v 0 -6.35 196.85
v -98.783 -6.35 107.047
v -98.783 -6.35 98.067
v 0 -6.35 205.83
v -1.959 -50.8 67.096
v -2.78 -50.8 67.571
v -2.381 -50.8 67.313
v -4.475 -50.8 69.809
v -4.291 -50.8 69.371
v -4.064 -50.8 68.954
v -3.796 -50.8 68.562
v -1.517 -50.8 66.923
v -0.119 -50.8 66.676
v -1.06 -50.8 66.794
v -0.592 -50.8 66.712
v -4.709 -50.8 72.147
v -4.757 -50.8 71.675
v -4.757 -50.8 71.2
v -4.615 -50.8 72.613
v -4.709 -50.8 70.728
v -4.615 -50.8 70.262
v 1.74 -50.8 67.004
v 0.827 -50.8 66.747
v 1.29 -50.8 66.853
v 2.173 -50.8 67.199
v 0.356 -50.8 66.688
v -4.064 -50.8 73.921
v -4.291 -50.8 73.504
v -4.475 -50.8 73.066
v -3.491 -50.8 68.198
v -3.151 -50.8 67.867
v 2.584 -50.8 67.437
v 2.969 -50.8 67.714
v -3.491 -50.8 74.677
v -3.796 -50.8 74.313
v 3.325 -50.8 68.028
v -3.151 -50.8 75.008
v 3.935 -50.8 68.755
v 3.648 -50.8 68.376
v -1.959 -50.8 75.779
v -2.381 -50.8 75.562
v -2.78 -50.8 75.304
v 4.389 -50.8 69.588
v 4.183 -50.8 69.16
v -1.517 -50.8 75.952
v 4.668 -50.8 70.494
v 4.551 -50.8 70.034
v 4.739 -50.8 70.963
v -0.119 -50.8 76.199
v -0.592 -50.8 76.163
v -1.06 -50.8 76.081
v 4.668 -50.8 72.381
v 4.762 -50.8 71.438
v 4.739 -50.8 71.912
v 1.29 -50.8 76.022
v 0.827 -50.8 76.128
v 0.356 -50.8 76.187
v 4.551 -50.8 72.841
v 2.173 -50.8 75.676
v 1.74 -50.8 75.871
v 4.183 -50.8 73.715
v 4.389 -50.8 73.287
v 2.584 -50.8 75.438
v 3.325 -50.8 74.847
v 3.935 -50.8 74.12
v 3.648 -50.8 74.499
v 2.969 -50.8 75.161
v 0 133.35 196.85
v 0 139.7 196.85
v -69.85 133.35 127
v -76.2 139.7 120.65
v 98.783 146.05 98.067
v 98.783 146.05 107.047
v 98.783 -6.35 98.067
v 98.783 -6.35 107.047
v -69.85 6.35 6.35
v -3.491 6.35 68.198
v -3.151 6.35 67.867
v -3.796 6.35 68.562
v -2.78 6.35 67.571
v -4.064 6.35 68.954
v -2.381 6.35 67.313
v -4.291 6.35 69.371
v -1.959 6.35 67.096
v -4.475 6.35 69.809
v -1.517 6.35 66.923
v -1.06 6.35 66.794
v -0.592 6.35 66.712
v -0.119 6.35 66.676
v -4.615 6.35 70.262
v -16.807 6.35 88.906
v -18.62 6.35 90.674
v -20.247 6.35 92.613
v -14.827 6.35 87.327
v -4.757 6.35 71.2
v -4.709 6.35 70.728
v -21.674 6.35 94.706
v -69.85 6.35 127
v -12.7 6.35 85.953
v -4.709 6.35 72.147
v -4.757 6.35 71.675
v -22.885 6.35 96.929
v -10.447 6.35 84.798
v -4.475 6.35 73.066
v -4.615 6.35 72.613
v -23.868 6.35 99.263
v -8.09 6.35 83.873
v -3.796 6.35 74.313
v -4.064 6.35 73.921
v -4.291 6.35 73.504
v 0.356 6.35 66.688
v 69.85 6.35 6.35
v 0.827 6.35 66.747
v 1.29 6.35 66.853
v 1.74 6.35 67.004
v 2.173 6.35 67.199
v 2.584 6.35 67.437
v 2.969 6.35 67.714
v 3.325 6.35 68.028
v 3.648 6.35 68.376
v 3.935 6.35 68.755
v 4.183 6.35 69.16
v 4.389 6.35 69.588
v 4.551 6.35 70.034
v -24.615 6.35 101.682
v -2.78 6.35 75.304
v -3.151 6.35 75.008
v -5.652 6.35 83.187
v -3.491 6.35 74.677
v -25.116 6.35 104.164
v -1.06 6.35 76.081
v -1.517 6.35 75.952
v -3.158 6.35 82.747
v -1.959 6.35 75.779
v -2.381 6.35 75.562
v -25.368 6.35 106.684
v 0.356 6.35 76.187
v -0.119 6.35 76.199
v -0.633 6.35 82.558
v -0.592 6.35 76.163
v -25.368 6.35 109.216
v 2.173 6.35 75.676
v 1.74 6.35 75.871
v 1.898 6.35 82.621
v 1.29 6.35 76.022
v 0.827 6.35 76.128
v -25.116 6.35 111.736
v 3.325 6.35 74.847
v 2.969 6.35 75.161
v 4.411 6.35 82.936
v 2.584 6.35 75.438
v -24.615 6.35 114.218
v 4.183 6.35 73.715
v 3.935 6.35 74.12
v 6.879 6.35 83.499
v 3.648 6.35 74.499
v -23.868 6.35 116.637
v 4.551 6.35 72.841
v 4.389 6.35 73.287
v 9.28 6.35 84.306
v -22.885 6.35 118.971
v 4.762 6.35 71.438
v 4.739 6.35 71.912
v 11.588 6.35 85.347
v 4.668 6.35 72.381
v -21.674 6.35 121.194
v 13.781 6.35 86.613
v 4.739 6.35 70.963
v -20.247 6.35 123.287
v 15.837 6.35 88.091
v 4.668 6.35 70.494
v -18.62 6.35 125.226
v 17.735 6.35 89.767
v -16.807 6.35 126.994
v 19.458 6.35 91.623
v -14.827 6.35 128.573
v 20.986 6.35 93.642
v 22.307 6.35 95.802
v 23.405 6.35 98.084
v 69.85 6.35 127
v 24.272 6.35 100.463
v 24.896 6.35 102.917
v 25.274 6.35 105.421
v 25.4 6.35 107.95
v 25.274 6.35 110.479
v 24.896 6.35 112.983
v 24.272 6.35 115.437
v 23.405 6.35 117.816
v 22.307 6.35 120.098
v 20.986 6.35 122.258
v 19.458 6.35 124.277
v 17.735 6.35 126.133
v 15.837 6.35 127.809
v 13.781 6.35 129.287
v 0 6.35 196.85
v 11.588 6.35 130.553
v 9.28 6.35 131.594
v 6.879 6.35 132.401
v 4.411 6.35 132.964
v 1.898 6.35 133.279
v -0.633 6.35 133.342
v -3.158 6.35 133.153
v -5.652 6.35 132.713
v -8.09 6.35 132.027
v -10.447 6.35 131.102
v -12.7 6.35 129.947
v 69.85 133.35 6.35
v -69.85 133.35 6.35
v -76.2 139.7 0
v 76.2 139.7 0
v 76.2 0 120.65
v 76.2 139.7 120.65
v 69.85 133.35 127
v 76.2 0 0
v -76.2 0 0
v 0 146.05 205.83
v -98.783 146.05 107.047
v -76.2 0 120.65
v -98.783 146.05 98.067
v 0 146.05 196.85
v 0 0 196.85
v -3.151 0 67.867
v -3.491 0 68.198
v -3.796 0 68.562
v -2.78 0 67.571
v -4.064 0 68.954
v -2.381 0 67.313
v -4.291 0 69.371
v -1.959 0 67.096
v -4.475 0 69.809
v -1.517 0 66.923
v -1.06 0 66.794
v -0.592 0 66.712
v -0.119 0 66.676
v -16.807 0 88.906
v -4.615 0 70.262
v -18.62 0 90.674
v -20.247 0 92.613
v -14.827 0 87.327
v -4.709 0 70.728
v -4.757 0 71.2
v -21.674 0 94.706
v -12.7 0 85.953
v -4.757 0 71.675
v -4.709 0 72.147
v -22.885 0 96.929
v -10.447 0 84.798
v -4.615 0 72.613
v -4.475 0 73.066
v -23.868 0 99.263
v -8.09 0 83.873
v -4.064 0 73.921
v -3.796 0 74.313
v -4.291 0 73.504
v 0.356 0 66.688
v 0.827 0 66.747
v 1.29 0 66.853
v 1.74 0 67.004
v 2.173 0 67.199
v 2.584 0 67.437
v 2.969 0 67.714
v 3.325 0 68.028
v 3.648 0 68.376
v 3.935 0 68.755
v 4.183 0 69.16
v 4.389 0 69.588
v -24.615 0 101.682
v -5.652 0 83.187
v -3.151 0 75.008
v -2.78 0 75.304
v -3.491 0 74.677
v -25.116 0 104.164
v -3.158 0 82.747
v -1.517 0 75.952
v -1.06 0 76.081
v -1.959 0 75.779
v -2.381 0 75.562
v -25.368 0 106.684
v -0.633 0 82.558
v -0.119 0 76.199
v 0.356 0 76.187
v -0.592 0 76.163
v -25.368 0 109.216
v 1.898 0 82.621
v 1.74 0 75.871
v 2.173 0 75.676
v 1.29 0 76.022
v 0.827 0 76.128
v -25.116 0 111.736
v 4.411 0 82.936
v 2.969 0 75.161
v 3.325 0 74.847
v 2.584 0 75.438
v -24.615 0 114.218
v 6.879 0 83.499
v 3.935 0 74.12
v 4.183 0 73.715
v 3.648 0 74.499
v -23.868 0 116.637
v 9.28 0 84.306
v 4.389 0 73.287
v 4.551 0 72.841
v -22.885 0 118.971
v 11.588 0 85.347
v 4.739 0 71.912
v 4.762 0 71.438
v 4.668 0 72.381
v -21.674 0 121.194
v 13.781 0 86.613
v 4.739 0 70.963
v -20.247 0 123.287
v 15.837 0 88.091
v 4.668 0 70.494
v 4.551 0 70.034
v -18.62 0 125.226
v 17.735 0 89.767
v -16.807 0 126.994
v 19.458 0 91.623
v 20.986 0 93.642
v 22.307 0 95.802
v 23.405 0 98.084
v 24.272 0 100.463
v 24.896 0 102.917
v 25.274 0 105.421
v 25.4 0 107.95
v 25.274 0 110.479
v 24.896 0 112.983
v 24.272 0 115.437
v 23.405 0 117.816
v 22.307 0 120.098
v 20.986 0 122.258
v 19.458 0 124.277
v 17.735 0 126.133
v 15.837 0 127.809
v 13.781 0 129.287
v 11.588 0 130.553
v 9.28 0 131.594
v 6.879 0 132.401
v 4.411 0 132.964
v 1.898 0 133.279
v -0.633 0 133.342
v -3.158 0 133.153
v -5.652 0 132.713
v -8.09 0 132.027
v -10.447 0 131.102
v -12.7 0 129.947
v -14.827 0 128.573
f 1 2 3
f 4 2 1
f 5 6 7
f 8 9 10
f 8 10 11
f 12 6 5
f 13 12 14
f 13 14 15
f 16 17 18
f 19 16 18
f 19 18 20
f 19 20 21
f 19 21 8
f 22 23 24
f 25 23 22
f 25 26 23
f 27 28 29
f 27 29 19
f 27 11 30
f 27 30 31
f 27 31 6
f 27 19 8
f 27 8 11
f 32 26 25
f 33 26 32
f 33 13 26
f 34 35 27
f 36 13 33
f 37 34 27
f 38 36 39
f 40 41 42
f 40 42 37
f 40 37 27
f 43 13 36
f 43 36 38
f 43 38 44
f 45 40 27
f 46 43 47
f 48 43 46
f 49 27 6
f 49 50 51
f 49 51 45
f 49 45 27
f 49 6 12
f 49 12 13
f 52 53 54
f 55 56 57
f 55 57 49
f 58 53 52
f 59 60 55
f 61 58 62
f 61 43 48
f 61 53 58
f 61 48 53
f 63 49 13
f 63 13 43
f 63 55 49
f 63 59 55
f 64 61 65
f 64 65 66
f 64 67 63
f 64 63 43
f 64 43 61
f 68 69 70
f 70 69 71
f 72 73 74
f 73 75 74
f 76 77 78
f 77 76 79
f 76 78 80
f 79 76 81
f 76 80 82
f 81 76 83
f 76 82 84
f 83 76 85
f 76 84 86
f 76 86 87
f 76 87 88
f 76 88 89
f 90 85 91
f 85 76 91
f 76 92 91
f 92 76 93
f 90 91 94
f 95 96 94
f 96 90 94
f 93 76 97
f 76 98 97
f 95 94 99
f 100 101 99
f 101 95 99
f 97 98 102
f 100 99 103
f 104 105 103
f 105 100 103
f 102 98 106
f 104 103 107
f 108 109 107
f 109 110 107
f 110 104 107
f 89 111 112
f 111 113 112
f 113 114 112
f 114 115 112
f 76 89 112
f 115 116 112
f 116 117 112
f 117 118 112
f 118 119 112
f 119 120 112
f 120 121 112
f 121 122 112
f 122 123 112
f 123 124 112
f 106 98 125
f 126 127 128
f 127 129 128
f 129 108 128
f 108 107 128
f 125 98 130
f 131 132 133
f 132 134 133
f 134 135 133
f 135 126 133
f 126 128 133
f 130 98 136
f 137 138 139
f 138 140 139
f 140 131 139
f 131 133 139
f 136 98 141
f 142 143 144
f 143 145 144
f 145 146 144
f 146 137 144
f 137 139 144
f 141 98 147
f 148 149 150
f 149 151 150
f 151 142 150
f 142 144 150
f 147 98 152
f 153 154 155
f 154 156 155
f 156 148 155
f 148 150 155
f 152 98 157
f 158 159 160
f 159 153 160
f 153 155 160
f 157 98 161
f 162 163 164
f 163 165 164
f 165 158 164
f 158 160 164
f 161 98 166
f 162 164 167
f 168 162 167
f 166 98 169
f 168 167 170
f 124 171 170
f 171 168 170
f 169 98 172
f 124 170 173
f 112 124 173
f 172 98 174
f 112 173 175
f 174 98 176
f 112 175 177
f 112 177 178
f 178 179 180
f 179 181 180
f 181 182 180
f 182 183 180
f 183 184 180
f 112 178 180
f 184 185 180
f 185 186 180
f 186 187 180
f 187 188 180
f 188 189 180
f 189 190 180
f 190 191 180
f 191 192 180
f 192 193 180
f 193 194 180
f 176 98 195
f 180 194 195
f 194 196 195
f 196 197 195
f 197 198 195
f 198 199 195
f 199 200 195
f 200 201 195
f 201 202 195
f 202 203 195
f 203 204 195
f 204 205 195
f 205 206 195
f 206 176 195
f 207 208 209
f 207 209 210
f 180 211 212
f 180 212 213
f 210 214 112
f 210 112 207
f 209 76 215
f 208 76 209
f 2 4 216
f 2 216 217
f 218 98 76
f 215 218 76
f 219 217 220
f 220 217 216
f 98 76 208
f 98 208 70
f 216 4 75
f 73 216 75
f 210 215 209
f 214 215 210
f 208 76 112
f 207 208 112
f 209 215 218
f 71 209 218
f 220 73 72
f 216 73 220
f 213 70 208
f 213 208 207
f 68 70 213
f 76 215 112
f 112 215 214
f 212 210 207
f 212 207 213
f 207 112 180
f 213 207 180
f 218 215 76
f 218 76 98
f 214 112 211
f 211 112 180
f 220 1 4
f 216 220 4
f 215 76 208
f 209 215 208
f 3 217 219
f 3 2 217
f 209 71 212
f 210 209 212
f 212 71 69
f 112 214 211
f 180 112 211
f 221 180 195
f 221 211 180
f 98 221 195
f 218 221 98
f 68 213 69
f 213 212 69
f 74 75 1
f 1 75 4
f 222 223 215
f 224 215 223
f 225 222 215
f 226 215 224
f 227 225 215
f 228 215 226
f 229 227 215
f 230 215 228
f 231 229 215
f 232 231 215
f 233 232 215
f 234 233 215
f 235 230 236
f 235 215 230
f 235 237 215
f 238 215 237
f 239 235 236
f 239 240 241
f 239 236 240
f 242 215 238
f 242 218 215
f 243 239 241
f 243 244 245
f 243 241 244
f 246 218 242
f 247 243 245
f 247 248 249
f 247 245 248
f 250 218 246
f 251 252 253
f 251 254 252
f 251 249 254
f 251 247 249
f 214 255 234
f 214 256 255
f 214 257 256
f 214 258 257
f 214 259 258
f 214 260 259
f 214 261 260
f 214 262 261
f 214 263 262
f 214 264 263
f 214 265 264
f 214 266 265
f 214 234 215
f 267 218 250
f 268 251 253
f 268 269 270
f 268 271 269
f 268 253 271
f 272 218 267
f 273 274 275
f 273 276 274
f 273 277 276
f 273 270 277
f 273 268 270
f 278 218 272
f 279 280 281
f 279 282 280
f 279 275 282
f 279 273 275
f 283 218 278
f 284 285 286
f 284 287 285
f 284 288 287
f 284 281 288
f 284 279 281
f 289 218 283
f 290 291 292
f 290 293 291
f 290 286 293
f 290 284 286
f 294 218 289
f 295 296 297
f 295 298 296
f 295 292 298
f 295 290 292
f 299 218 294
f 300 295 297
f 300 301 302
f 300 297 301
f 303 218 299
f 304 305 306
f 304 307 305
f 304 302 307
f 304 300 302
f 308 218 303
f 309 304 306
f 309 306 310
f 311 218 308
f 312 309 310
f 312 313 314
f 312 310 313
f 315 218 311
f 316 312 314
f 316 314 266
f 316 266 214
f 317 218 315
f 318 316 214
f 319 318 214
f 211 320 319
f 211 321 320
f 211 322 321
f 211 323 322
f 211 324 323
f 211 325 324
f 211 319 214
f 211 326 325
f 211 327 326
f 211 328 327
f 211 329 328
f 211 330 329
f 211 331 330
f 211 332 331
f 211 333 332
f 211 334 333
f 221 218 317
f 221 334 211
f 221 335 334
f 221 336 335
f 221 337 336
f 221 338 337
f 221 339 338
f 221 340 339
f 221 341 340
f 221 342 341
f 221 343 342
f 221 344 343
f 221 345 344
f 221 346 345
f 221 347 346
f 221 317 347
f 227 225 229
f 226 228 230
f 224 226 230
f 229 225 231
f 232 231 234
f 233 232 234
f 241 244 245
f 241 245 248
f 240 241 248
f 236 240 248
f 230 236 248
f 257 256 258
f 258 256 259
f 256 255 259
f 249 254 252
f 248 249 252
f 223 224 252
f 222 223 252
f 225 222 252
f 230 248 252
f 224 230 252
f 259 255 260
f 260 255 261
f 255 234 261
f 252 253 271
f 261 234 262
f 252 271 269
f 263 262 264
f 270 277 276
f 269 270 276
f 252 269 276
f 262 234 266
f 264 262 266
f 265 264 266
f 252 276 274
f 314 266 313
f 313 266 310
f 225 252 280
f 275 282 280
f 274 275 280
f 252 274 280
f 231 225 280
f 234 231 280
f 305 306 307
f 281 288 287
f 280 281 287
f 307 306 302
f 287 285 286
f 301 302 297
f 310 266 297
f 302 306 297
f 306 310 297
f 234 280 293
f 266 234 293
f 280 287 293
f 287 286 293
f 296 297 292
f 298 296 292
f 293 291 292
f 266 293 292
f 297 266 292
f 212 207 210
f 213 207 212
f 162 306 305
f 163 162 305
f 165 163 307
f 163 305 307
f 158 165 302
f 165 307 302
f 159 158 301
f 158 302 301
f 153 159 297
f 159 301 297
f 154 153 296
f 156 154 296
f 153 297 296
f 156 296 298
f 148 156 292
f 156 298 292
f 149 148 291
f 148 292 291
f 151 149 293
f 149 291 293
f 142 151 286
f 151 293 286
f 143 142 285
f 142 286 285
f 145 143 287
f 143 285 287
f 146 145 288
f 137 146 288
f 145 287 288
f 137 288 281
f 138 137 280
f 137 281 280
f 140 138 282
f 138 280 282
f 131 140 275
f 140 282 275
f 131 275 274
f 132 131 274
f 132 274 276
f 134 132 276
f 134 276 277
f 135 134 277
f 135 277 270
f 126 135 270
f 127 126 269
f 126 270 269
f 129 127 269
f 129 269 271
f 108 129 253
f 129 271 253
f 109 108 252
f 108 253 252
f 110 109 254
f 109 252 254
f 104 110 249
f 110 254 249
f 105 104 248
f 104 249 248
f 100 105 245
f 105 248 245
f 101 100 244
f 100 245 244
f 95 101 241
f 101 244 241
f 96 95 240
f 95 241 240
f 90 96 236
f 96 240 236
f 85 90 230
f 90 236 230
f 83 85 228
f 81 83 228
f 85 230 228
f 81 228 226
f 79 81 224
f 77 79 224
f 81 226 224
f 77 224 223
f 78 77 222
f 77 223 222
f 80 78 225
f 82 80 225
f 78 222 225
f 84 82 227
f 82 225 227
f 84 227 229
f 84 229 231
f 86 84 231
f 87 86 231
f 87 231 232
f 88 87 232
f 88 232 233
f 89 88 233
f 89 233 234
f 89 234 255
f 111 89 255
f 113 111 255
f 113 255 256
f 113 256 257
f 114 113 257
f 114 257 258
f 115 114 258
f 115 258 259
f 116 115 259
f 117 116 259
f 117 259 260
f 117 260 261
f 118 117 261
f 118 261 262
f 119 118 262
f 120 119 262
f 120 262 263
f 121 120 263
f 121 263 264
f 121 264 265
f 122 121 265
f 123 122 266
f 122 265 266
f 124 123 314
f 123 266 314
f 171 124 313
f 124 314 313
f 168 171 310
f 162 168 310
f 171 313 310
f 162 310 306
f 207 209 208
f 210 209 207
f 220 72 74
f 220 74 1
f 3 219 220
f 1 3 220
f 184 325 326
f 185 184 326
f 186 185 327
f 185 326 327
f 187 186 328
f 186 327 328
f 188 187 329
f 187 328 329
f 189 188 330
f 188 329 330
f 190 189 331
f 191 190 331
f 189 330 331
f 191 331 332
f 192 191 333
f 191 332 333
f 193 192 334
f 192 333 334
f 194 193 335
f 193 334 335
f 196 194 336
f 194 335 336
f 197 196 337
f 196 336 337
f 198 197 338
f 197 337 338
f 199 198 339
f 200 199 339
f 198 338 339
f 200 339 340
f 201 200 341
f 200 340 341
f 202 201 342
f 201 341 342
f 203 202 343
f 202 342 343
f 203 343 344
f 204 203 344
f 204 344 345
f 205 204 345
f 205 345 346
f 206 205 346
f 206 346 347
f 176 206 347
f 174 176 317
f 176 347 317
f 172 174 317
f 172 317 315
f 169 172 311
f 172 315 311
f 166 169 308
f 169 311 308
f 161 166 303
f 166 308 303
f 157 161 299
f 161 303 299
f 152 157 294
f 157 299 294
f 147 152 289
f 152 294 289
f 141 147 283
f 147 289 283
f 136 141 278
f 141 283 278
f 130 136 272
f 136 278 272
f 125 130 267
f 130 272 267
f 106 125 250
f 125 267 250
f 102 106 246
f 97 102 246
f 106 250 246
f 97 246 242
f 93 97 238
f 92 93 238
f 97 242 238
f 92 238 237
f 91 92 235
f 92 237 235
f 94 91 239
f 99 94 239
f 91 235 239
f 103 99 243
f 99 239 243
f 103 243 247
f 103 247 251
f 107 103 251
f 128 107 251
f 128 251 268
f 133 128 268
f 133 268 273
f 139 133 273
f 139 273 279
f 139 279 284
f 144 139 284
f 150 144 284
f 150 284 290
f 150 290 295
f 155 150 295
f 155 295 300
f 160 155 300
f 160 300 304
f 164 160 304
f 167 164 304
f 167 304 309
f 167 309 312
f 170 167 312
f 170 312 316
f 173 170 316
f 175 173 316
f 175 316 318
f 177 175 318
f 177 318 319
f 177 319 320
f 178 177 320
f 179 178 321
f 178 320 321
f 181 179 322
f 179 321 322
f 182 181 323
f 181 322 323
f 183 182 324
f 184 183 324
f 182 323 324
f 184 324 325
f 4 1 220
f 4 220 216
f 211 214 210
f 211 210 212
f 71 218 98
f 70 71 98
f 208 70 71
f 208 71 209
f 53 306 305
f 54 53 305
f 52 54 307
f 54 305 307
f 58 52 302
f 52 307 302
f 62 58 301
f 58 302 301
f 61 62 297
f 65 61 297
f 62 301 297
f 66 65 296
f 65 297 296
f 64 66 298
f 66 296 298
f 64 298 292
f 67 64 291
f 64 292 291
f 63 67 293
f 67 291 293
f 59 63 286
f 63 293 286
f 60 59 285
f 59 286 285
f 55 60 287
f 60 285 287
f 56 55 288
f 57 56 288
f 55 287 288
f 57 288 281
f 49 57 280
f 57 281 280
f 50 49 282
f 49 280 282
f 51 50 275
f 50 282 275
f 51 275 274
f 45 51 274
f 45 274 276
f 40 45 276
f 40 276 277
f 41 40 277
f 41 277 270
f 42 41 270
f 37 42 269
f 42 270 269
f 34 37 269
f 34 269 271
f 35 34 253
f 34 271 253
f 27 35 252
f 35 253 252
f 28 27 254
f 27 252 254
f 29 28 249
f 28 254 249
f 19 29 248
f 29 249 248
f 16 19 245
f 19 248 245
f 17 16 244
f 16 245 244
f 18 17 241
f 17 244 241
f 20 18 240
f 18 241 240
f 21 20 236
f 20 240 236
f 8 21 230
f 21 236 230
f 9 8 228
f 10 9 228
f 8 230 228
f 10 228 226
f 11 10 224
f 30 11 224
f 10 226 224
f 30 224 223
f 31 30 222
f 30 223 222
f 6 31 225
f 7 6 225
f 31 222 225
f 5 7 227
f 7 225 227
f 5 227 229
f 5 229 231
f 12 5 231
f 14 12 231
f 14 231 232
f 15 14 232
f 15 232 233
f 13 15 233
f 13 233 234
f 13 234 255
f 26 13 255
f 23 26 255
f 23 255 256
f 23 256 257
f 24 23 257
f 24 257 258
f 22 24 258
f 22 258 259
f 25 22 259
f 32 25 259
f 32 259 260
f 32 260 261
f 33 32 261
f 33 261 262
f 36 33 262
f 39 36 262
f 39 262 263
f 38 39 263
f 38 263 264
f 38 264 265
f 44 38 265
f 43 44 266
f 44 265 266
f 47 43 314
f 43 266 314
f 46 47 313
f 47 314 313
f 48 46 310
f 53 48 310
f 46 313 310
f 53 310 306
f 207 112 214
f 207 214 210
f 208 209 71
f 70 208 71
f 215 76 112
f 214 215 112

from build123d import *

# Parameters (mm, degrees)
F0_W           = 152.4
F0_H           = 6.35
F1_DEPTH       = 139.7
F2_SIZE2       = 6.34999
F2_SIZE        = 6.34999
F3_W           = 6.35
F3_H           = 127
F4_DEPTH       = 139.7
F5_SIZE2       = 6.34999
F5_SIZE        = 6.34999
F5_2_SIZE2     = 6.34999
F5_2_SIZE      = 6.34999
F7_R           = 4.7625
F7_R_2         = 25.4
F8_DEPTH       = 6.35
F10_DEPTH      = 6.35
F11_SIZE2      = 6.34999
F11_SIZE       = 6.34999
F11_2_SIZE2    = 6.34999
F11_2_SIZE     = 6.34999
F13_DEPTH      = 6.35
F13_DEPTH_BACK = 146.05
F16_DEPTH      = 50.8


# Not quite as in the source:
# - a fillet or chamfer is up to 0.001 mm smaller than in the source, because OpenCascade refuses the exact size


with BuildPart() as f1:
    # F0 (on Front) → F1 (new body)
    with BuildSketch(Plane.XZ):
        with Locations((0, 3.175)):
            Rectangle(F0_W, F0_H)
    extrude(amount=-F1_DEPTH)

    # F2 (size 6.35 and 6.35 in the source; OpenCascade refuses exactly that, so slightly less here)
    f2_edges = [f1.edges().sort_by_distance(p)[0] for p in [
        (76.2, 69.85, 6.35),
        (-76.2, 69.85, 6.35),
        (0, 0, 6.35),
        (0, 139.7, 6.35),
    ]]
    chamfer(f2_edges, length=F2_SIZE, length2=F2_SIZE2)


with BuildPart() as f4:
    # F3 (on Front) → F4 (new body)
    with BuildSketch(Plane.XZ):
        with Locations((-73.025, 63.5)):
            Rectangle(F3_W, F3_H)
    extrude(amount=-F4_DEPTH)

    # F5 (size 6.35 and 6.35 in the source; OpenCascade refuses exactly that, so slightly less here)
    f5_edges = [f4.edges().sort_by_distance(p)[0] for p in [
        (-69.85, 139.7, 63.5),
        (-69.85, 69.85, 0),
        (-69.85, 0, 63.5),
    ]]
    chamfer(f5_edges, length=F5_SIZE, length2=F5_SIZE2)


with BuildPart() as f4b:
    # F3 (on Front) → F4, piece 2 (new body)
    with BuildSketch(Plane.XZ):
        with Locations((73.025, 63.5)):
            Rectangle(F3_W, F3_H)
    extrude(amount=-F4_DEPTH)

    # F5#2 (size 6.35 and 6.35 in the source; OpenCascade refuses exactly that, so slightly less here)
    f5_2_edges = [f4b.edges().sort_by_distance(p)[0] for p in [
        (69.85, 0, 63.5),
        (69.85, 69.85, 0),
        (69.85, 139.7, 63.5),
    ]]
    chamfer(f5_2_edges, length=F5_2_SIZE, length2=F5_2_SIZE2)


with BuildPart() as f8:
    # F7 (on Front) → F8 (new body)
    with BuildSketch(Plane.XZ):
        Polygon((76.2, 120.65), (0, 196.85), (-76.2, 120.65), (-76.2, 0), (76.2, 0), align=None)
        with Locations((0, 71.4375)):
            Circle(F7_R, mode=Mode.SUBTRACT)
        with Locations((0, 107.95)):
            Circle(F7_R_2, mode=Mode.SUBTRACT)
    extrude(amount=-F8_DEPTH)

    # F11 (size 6.35 and 6.35 in the source; OpenCascade refuses exactly that, so slightly less here)
    f11_edges = [f8.edges().sort_by_distance(p)[0] for p in [
        (76.2, 6.35, 60.325),
        (0, 6.35, 0),
        (-76.2, 6.35, 60.325),
    ]]
    chamfer(f11_edges, length=F11_SIZE, length2=F11_SIZE2)


with BuildPart() as f10:
    # F9 (on offset) → F10 (new body)
    with BuildSketch(Plane.XZ.offset(-139.7)):
        Polygon((76.2, 120.65), (0, 196.85), (-76.2, 120.65), (-76.2, 0), (76.2, 0), align=None)
    extrude(amount=F10_DEPTH)

    # F11#2 (size 6.35 and 6.35 in the source; OpenCascade refuses exactly that, so slightly less here)
    f11_2_edges = [f10.edges().sort_by_distance(p)[0] for p in [
        (-76.2, 133.35, 60.325),
        (0, 133.35, 0),
        (76.2, 133.35, 60.325),
    ]]
    chamfer(f11_2_edges, length=F11_2_SIZE, length2=F11_2_SIZE2)


with BuildPart() as f13:
    # F12 (on Front) → F13 (new body, two sides)
    with BuildSketch(Plane.XZ) as f13_sk:
        Polygon((-98.7828173318, 98.0671826682), (0, 196.85), (0, 205.8302561211), (-98.7828173318, 107.0474387893), align=None)
    extrude(amount=F13_DEPTH)
    extrude(f13_sk.sketch, amount=-F13_DEPTH_BACK)


with BuildPart() as f14_1:
    # F14: instance of F13
    add(f13.part.mirror(Plane.YZ))


with BuildPart() as f4_1:
    add(f4.part)

    # F15: cut F13, F14_1
    add(f13.part, mode=Mode.SUBTRACT)
    add(f14_1.part, mode=Mode.SUBTRACT)


with BuildPart() as f4b_1:
    add(f4b.part)

    # F15: cut F13, F14_1
    add(f13.part, mode=Mode.SUBTRACT)
    add(f14_1.part, mode=Mode.SUBTRACT)


with BuildPart() as f16:
    # F7 (on Front) → F16 (new body)
    with BuildSketch(Plane.XZ):
        with Locations((0, 71.4375)):
            Circle(F7_R)
    extrude(amount=F16_DEPTH)


solid = Compound([f1.part, f8.part, f10.part, f13.part, f14_1.part, f4_1.part, f4b_1.part, f16.part])
